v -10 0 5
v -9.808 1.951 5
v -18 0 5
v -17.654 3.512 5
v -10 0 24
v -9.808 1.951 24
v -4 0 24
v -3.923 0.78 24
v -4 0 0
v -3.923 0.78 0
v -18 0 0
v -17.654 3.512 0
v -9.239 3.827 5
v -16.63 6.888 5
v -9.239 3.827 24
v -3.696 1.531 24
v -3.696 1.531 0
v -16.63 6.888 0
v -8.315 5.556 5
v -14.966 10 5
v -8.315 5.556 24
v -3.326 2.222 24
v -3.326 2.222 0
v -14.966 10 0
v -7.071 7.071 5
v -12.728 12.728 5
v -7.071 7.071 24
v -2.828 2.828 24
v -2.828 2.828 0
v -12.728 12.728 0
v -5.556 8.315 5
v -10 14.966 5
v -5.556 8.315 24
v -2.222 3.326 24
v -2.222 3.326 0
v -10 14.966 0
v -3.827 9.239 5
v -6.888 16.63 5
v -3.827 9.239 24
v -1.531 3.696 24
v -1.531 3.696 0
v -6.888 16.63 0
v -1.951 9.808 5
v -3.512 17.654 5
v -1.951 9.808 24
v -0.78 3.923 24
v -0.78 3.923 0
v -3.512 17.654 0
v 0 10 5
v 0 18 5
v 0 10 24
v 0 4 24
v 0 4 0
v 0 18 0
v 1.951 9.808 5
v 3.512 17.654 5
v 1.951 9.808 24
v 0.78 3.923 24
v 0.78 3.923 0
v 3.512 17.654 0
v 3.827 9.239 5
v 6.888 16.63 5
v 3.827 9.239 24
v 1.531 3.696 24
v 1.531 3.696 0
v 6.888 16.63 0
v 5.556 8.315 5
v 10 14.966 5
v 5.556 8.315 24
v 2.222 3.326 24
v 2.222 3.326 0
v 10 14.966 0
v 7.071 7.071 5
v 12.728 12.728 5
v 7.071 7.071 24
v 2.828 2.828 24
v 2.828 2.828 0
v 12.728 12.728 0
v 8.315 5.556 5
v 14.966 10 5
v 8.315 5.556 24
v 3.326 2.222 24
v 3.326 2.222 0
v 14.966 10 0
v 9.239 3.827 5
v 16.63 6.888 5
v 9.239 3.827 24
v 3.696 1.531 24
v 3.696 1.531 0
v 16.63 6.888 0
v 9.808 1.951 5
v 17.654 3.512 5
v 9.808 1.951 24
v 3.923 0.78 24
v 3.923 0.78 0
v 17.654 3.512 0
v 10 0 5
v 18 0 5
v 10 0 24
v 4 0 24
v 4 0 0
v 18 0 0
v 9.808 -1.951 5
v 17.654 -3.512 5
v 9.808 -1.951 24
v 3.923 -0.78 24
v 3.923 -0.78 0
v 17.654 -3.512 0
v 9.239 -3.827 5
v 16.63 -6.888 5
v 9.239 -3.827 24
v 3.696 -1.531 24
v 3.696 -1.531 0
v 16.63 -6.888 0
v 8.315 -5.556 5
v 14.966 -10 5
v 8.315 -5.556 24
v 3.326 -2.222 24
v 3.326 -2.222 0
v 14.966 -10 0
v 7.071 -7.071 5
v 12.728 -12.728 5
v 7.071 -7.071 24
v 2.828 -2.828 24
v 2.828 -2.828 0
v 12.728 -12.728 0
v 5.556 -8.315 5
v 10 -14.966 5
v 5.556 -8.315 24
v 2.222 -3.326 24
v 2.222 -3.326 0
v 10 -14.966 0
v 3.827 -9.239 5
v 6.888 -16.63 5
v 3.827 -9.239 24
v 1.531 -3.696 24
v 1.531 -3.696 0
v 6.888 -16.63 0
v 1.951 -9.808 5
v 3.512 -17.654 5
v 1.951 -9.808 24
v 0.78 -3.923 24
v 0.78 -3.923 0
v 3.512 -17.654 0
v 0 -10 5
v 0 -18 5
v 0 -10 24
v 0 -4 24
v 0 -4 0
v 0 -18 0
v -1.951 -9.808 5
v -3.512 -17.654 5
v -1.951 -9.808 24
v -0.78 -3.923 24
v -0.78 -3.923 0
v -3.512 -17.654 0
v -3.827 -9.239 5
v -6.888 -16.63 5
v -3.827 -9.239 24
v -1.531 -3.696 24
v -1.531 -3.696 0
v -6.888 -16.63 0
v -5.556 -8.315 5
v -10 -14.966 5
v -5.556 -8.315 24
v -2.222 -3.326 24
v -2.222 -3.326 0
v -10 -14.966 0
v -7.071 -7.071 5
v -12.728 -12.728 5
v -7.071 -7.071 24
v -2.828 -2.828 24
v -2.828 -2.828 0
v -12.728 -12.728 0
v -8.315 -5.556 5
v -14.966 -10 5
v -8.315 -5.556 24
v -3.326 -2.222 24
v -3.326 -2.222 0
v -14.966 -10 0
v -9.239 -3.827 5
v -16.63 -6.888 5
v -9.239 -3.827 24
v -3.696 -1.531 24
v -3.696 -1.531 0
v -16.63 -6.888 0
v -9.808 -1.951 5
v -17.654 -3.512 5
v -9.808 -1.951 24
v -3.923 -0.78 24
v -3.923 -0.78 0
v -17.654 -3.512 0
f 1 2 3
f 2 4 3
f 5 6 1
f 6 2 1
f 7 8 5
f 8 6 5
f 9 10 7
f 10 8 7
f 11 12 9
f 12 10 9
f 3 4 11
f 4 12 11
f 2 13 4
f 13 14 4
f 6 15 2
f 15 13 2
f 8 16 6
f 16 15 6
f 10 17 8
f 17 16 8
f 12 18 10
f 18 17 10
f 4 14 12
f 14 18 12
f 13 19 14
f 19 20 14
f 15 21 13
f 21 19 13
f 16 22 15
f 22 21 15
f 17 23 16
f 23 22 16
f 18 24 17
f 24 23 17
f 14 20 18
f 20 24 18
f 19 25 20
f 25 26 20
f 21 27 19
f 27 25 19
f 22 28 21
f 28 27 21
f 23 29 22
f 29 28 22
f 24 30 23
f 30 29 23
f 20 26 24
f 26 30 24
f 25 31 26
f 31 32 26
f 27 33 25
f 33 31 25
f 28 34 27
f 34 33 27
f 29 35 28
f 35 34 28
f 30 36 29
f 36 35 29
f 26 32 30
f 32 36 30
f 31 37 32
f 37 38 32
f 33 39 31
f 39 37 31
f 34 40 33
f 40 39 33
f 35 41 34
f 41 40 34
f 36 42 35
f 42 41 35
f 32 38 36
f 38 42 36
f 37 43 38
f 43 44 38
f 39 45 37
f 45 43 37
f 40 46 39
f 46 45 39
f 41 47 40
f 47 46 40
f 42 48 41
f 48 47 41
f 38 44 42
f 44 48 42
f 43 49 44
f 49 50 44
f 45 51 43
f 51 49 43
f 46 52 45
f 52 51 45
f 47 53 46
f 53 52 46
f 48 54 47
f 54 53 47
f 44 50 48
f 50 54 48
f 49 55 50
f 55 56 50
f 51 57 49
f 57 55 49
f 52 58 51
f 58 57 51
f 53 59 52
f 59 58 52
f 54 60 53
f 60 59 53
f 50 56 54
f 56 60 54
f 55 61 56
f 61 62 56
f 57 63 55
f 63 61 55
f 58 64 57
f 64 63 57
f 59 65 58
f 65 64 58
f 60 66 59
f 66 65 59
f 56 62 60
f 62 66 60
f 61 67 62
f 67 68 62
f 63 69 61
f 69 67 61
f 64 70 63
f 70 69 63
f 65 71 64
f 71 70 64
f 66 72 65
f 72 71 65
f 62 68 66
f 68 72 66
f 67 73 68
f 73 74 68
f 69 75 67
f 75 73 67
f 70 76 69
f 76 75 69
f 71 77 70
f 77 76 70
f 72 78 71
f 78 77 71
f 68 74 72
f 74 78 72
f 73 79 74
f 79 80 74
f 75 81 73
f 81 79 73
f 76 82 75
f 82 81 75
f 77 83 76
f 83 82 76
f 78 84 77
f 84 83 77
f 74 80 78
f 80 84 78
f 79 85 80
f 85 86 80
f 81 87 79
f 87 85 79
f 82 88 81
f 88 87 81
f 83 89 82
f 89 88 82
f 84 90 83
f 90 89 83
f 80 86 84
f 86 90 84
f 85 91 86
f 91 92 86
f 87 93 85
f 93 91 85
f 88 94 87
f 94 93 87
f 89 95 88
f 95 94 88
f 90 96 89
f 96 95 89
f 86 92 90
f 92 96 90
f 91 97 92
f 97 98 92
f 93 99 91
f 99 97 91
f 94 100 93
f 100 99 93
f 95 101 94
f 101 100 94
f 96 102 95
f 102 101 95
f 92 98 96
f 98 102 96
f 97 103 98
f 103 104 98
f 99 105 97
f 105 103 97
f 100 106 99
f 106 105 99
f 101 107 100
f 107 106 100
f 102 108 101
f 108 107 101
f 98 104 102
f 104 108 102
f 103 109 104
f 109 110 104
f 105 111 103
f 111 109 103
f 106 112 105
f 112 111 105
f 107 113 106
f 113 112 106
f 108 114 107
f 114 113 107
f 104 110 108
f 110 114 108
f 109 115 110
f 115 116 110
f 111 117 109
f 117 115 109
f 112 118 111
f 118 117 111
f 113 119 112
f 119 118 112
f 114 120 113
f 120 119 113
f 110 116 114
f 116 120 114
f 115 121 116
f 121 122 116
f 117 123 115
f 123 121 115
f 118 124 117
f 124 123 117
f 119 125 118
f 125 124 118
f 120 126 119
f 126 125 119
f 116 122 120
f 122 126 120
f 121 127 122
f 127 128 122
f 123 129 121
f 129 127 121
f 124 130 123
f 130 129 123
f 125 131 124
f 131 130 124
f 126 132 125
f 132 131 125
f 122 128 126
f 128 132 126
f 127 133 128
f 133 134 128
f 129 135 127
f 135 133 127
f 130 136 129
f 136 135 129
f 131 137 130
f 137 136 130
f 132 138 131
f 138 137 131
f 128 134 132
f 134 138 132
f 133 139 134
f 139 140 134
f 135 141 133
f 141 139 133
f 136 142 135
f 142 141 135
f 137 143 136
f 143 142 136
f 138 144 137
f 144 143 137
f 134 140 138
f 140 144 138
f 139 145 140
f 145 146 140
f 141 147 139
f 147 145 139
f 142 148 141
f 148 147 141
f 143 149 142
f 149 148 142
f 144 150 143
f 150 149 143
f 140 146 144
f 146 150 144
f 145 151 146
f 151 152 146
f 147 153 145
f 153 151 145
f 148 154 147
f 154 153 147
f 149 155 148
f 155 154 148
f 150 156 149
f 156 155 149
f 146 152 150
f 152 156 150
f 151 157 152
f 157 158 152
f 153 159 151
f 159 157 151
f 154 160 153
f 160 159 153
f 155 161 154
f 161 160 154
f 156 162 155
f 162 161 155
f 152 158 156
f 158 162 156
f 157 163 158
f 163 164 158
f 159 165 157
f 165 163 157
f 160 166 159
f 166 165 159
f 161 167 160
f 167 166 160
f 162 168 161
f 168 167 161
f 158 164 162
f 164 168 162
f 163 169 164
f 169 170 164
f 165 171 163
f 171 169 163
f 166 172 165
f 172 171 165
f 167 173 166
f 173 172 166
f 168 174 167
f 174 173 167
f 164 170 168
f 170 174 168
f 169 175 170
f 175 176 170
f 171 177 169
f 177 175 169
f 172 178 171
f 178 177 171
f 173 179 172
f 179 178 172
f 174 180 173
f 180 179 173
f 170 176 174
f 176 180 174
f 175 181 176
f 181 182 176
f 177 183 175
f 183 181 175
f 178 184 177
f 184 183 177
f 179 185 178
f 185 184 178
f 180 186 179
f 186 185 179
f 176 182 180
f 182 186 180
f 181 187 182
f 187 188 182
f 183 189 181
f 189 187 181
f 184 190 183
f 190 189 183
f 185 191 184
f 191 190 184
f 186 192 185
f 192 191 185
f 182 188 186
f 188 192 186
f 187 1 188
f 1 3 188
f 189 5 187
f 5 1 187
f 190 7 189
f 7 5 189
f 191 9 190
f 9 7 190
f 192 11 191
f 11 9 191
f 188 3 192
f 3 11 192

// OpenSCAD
$fn = 32;

// ----------------------------------------------------------------------
// Revolved part: flanged bushing R18
// ----------------------------------------------------------------------

// --- parameters (mm) ---
bore_r = 4;               // bore radius
flange_r = 18;            // flange radius
flange_h = 5;             // flange thickness
sleeve_r = 10;            // sleeve radius
total_h = 24;             // overall height
revolve_angle = 360;      // revolve sweep, degrees

bore_d = 2 * bore_r;
flange_d = 2 * flange_r;
sleeve_d = 2 * sleeve_r;

profile = [[4, 0], [18, 0], [18, 5], [10, 5], [10, 24], [4, 24]];  // primary outline, 6 points, counter clockwise

// --- the one profile operation ---
rotate_extrude(angle = revolve_angle) polygon(points = profile);
